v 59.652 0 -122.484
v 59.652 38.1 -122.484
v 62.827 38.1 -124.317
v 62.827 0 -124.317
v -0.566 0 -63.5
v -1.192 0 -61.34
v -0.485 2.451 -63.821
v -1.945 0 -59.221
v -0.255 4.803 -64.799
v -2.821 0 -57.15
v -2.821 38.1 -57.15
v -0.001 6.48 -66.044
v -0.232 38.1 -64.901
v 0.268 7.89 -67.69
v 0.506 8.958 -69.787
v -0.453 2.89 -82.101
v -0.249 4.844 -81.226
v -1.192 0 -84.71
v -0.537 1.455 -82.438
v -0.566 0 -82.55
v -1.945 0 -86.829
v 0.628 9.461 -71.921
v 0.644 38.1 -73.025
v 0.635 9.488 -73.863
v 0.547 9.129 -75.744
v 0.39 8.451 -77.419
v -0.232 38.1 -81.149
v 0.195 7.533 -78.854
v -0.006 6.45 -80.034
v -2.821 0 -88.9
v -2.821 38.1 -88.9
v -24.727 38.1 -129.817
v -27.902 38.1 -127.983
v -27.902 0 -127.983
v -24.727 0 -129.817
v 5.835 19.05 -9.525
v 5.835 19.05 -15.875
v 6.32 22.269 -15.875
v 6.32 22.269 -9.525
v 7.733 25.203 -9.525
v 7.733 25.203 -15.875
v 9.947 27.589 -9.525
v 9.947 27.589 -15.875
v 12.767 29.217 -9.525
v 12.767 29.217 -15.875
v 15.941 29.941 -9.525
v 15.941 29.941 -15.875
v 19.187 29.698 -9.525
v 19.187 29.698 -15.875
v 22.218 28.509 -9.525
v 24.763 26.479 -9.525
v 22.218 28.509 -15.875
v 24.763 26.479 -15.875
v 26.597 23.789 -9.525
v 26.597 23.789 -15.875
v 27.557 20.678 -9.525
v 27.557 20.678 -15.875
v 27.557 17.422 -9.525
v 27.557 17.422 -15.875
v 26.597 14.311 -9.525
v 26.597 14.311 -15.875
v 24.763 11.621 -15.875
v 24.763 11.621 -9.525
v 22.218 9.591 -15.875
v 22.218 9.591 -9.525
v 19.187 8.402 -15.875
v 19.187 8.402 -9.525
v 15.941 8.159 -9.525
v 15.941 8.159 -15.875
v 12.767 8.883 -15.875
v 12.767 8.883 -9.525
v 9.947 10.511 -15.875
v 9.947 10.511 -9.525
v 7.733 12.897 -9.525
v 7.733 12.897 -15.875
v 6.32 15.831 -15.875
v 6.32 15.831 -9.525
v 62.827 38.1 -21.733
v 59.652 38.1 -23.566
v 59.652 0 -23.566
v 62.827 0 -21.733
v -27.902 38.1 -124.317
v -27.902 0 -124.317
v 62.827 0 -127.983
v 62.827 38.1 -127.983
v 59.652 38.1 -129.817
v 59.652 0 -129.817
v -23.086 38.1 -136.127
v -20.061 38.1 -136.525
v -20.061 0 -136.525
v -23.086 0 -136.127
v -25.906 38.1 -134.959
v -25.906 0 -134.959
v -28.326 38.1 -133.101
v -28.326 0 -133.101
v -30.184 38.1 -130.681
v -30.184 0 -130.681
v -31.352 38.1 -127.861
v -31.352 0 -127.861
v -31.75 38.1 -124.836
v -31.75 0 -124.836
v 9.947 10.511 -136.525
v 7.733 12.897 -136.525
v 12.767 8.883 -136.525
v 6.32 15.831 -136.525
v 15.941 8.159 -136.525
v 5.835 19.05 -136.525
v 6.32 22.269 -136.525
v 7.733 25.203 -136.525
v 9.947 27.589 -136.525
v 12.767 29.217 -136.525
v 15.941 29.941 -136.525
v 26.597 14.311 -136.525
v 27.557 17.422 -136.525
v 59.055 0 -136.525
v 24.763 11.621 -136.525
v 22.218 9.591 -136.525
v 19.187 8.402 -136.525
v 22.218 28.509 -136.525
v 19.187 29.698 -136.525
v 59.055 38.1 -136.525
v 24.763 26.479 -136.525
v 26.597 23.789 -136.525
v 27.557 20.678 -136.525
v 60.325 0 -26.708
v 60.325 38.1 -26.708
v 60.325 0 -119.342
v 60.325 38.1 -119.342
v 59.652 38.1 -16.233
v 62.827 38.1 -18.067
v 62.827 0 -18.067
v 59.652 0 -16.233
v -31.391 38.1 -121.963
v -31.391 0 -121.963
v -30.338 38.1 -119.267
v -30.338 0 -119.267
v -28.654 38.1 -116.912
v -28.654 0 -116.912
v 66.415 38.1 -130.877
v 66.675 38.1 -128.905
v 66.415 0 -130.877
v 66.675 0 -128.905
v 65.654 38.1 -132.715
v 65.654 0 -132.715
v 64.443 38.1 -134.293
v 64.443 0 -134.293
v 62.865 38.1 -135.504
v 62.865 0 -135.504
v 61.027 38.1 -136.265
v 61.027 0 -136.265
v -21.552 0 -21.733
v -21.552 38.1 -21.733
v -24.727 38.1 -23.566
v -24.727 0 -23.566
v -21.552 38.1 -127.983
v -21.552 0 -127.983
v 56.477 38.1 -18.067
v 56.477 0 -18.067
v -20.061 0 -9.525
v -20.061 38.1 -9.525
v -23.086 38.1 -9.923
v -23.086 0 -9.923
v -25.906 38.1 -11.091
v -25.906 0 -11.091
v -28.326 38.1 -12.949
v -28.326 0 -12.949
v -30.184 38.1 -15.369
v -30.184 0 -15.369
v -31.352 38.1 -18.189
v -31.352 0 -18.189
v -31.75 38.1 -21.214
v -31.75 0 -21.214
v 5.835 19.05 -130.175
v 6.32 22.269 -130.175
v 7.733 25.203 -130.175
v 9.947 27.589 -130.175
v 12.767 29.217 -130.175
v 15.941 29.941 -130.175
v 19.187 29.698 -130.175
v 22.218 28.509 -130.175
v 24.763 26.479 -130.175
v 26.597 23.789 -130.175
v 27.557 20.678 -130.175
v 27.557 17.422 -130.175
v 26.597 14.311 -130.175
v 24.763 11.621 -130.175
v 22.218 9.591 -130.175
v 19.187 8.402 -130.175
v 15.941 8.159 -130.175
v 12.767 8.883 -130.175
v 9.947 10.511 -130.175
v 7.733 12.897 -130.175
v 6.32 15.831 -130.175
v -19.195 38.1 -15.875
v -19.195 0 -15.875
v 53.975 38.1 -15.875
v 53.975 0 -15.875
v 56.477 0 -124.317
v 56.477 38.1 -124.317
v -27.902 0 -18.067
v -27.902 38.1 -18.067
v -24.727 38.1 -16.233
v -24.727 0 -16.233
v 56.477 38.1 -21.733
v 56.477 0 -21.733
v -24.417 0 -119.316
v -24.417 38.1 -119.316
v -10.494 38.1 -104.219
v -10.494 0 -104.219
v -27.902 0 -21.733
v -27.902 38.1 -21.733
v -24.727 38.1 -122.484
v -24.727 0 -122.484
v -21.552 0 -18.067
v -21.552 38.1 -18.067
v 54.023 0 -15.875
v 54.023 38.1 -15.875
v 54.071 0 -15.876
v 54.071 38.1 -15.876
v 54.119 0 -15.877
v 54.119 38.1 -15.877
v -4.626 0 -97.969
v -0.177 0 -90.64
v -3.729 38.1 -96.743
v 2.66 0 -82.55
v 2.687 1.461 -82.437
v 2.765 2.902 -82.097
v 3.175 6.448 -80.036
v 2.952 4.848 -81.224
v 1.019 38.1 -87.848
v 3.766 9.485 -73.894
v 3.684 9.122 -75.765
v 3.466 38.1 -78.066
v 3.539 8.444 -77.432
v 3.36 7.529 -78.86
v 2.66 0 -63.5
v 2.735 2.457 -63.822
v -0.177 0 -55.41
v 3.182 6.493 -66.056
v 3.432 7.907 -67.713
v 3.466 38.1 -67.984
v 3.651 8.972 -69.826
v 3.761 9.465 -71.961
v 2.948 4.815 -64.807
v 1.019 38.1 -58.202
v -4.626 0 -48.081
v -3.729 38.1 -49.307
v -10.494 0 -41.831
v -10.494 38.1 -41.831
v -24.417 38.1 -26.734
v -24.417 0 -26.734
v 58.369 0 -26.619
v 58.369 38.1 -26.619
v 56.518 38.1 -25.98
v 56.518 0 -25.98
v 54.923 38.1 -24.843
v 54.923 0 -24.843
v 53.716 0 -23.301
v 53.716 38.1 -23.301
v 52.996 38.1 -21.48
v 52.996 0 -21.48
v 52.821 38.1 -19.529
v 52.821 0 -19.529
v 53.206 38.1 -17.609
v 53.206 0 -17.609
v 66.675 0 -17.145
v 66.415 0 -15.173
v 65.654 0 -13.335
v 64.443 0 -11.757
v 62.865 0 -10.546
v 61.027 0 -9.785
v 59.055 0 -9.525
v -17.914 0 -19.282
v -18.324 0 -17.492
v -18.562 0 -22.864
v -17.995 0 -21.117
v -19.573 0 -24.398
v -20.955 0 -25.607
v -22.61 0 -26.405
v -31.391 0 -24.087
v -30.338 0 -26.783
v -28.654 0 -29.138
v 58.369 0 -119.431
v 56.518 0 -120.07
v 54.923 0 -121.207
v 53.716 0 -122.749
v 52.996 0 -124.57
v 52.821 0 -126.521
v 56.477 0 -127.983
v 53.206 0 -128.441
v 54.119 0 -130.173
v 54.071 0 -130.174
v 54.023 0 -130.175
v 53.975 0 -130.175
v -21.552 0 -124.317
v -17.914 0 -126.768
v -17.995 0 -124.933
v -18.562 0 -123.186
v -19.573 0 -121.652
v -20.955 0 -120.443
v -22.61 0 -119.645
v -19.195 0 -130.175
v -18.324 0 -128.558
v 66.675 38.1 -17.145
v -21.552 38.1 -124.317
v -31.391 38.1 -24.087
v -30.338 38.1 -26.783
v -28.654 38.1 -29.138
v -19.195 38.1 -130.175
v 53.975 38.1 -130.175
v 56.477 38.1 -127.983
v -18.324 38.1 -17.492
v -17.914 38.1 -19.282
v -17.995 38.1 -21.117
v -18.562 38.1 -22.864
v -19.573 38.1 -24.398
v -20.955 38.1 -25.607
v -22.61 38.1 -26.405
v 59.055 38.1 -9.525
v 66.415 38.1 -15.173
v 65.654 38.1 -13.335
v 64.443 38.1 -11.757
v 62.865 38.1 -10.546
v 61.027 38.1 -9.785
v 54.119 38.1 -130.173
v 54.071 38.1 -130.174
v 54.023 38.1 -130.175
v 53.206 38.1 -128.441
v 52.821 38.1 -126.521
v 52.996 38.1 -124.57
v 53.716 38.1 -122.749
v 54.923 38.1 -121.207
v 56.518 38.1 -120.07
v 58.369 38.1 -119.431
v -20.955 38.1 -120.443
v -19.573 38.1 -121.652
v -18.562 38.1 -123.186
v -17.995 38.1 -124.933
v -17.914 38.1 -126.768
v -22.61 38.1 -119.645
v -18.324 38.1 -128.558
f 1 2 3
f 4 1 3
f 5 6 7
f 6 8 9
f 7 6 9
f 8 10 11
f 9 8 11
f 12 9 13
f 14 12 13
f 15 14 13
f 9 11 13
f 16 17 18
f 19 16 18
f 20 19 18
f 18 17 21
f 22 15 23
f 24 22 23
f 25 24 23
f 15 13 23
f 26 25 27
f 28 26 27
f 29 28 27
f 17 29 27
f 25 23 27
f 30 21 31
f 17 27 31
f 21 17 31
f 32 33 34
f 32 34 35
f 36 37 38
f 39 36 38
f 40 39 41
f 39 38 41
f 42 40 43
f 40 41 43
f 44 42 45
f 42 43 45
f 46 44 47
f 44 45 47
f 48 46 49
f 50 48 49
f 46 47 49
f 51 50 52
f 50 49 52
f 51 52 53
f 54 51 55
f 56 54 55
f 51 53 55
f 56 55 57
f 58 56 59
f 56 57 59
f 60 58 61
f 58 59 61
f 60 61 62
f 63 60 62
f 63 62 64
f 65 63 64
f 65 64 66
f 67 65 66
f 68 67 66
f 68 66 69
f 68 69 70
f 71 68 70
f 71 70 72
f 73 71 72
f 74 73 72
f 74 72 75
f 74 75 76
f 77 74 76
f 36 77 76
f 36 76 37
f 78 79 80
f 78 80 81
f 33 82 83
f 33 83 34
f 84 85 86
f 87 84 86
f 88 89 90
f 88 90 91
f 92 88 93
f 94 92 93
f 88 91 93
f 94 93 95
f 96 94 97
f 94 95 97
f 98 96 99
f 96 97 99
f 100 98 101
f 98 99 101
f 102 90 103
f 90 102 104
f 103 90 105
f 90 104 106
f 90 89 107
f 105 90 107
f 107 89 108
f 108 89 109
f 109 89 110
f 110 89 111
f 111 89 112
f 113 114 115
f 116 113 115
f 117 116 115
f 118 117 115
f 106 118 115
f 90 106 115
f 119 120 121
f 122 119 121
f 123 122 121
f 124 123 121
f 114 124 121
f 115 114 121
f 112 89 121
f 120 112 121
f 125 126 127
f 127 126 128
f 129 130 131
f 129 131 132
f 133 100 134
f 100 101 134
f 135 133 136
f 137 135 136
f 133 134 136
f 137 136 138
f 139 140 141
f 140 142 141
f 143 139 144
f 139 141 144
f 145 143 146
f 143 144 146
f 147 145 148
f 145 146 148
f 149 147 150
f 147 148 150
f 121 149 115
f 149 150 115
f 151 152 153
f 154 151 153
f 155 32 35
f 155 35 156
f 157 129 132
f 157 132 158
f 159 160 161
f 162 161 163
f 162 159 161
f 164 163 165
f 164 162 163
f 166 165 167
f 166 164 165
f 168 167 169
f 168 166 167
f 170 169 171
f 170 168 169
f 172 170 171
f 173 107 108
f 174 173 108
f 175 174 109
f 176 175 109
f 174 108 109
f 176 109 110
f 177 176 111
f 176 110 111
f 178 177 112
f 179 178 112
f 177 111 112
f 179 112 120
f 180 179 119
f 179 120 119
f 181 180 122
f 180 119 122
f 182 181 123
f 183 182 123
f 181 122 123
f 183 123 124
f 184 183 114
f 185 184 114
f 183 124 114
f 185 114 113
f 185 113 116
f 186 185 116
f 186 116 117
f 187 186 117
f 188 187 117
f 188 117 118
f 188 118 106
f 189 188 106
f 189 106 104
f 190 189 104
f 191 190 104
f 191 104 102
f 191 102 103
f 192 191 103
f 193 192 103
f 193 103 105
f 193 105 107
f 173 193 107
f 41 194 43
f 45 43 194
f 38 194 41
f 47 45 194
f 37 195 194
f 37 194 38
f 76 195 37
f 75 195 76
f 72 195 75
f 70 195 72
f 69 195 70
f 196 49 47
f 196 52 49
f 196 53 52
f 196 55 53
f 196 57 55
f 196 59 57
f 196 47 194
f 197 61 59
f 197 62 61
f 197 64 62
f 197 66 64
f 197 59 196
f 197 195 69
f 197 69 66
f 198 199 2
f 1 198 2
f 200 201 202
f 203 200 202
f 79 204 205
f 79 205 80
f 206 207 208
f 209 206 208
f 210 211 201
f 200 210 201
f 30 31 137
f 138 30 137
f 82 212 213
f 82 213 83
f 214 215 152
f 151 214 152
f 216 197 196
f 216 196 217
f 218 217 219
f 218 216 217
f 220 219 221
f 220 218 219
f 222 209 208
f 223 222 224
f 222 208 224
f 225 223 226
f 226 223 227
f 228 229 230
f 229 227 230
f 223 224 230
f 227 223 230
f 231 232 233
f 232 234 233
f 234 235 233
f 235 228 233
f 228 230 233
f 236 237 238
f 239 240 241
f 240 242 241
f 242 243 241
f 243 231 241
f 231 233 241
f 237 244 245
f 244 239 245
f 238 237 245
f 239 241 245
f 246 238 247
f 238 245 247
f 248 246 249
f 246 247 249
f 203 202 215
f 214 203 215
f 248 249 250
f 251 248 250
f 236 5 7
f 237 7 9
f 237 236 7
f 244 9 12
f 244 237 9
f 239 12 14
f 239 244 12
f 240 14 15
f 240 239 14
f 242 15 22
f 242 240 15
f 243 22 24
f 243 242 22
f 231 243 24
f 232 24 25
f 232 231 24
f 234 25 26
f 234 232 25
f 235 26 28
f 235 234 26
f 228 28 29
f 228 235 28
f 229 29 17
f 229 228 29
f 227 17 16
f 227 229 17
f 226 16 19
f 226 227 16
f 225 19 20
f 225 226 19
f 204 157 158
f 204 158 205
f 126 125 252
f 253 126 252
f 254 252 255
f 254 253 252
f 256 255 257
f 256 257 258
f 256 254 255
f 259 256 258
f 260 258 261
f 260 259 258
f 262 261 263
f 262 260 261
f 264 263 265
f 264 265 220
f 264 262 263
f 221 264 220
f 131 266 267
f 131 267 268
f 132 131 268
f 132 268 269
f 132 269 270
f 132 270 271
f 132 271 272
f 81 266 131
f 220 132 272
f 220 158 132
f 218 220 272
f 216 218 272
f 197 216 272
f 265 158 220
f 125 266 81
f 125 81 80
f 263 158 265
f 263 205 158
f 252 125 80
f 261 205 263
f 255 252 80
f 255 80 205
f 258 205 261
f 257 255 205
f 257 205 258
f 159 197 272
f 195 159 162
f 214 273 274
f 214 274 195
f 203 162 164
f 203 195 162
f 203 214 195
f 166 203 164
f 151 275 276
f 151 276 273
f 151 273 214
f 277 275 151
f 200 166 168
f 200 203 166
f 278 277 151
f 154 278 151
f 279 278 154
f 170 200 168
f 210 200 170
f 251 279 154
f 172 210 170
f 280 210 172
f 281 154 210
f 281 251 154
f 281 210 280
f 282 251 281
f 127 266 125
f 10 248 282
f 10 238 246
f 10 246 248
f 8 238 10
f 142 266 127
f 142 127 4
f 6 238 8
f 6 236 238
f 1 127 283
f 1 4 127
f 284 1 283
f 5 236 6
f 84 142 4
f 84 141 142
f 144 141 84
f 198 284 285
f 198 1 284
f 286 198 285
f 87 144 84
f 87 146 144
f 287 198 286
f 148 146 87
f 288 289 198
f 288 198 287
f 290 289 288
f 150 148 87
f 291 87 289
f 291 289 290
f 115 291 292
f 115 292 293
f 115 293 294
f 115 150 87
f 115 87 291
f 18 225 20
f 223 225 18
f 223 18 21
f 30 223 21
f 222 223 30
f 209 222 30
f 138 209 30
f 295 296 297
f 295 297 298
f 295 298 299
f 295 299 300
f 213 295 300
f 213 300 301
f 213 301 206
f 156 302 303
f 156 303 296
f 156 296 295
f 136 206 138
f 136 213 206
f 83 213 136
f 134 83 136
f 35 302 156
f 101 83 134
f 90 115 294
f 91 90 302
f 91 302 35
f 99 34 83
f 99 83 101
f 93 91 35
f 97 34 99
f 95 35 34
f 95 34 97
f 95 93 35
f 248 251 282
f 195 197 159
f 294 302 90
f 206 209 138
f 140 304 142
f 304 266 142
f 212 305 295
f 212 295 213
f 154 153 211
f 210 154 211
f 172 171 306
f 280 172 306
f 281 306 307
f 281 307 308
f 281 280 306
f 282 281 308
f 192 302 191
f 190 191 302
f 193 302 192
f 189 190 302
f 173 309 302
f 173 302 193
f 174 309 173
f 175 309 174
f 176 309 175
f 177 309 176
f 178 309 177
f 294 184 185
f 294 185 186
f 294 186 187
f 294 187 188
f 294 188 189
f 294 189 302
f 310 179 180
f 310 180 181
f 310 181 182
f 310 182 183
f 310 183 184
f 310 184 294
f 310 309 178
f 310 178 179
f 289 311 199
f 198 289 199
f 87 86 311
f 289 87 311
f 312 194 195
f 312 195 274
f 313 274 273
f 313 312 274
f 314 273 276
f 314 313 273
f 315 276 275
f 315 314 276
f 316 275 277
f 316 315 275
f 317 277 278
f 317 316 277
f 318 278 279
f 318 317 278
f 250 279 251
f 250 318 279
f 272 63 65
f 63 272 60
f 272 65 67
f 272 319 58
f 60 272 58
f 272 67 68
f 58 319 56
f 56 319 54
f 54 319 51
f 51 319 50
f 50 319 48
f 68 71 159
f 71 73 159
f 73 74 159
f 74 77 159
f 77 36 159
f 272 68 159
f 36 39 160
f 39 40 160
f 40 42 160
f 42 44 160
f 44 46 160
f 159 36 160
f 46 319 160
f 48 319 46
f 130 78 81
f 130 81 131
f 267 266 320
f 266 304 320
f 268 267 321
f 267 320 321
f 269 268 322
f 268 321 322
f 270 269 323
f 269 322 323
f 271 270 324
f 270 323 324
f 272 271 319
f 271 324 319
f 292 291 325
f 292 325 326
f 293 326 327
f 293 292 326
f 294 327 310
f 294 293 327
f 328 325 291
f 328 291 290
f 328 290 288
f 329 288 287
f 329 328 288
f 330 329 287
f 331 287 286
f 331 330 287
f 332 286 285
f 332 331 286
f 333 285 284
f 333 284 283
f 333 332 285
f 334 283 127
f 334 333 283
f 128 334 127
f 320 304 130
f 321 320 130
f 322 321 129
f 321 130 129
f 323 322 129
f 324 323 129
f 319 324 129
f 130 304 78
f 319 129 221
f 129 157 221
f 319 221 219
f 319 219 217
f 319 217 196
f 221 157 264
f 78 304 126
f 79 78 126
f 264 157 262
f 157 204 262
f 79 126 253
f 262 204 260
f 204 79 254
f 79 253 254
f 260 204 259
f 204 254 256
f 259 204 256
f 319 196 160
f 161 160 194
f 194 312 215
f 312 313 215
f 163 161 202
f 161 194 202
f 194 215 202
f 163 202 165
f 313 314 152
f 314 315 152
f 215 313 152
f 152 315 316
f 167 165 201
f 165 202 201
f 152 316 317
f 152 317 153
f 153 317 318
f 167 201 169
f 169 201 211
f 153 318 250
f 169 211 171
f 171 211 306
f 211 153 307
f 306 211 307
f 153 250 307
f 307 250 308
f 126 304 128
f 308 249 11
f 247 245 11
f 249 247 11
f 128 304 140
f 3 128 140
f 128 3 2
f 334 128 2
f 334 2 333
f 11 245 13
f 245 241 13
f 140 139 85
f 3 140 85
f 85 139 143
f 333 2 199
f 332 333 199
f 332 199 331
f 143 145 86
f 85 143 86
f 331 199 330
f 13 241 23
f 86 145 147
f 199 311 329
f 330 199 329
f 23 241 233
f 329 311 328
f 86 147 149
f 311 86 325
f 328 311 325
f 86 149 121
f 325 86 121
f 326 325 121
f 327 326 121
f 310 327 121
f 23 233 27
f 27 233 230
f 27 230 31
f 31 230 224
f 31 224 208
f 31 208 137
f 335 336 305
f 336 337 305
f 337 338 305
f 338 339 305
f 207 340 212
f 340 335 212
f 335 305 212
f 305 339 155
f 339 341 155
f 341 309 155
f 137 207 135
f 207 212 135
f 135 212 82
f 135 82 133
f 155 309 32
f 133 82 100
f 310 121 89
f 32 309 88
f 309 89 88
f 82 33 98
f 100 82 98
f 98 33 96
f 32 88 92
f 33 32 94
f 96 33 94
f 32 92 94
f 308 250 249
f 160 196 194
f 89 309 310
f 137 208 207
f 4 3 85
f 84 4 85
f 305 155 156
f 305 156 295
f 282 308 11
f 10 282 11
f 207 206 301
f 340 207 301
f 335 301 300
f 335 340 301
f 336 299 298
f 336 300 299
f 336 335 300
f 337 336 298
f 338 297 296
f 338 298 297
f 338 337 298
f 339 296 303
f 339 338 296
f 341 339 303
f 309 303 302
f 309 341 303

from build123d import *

# Parameters (mm, degrees)
SKETCH1_W               = 95.25
SKETCH1_H               = 6.35
BOSS_EXTRUDE1_DEPTH     = 38.1
SKETCH2_W               = 6.35
SKETCH2_H               = 127
BOSS_EXTRUDE2_DEPTH     = 38.1
SKETCH3_W               = 88.9
SKETCH3_H               = 6.35
BOSS_EXTRUDE3_DEPTH     = 38.1
FILLET1_R               = 7.62
BOSS_EXTRUDE4_DEPTH     = 38.1
CUT_EXTRUDE8_REACH      = 171.022
CUT_EXTRUDE8_END_RADIUS = 38.1
FILLET2_R               = 11.688947
FILLET3_R               = 11.688947
FILLET4_R               = 6.35
SKETCH15_R              = 6.841174209
BOSS_EXTRUDE7_DEPTH     = 38.1
CUT_EXTRUDE12_DEPTH     = 157.640484095
SKETCH4_R               = 10.922
CUT_EXTRUDE1_DEPTH      = 149.412147861


with BuildPart() as part:
    # Sketch1 → Boss-Extrude1 (new body)
    with BuildSketch(Plane(origin=(0, 0, 0), x_dir=(1, 0, 0), z_dir=(0, 1, 0))):
        with Locations((19.05, 12.7)):
            Rectangle(SKETCH1_W, SKETCH1_H)
    extrude(amount=BOSS_EXTRUDE1_DEPTH)

    # Sketch2 → Boss-Extrude2 (add)
    with BuildSketch(Plane(origin=(0, 38.1, 0), x_dir=(1, 0, 0), z_dir=(0, 1, 0))):
        with Locations((63.5, 73.025)):
            Rectangle(SKETCH2_W, SKETCH2_H)
    extrude(amount=-BOSS_EXTRUDE2_DEPTH)

    # Sketch3 → Boss-Extrude3 (add)
    with BuildSketch(Plane(origin=(0, 38.1, 0), x_dir=(1, 0, 0), z_dir=(0, 1, 0))):
        with Locations((15.875, 133.35)):
            Rectangle(SKETCH3_W, SKETCH3_H)
    extrude(amount=-BOSS_EXTRUDE3_DEPTH)

    # Fillet1
    fillet1_edges = [part.edges().sort_by_distance(p)[0] for p in [
        (66.675, 19.05, -136.525),
        (66.675, 19.05, -9.525),
    ]]
    fillet(fillet1_edges, radius=FILLET1_R)

    # Sketch10 → Boss-Extrude4 (add)
    with BuildSketch(Plane(origin=(0, 38.1, 0), x_dir=(1, 0, 0), z_dir=(0, 1, 0))):
        with BuildLine():
            Line((-28.575, 15.875), (-28.575, 9.525))
            Line((-28.575, 9.525), (-31.75, 9.525))
            Line((-31.75, 9.525), (-31.75, 25.781))
            Line((-31.75, 25.781), (-2.821027965, 57.15))
            ThreePointArc((-2.821027965, 57.15), (0.643811071, 73.025), (-2.821027965, 88.9))
            Line((-2.821027965, 88.9), (-31.75, 120.269))
            Line((-31.75, 120.269), (-31.75, 136.525))
            Line((-31.75, 136.525), (-28.575, 136.525))
            Line((-28.575, 136.525), (-28.575, 123.825))
            Line((-28.575, 123.825), (-10.494392478, 104.219375))
            ThreePointArc((-10.494392478, 104.219375), (3.775200806, 73.025), (-10.494392478, 41.830625))
            Line((-10.494392478, 41.830625), (-28.575, 22.225))
            Line((-28.575, 22.225), (-28.575, 15.875))
        make_face()
    extrude(amount=-BOSS_EXTRUDE4_DEPTH)

    # Cut-Extrude8: up to this cylinder (the profile starts outside it)
    cut_extrude8_end = Plane(origin=(-37.456188929, 4.042536, -73.025), z_dir=(0, 1, 0)) * Cylinder(CUT_EXTRUDE8_END_RADIUS, 419.244, mode=Mode.PRIVATE)
    # Sketch12 → Cut-Extrude8 (cut, up to the surface)
    with BuildSketch(Plane.ZY.offset(-60.325), mode=Mode.PRIVATE) as cut_extrude8_sk1:
        with BuildLine():
            Line((-82.55, 0), (-63.5, 0))
            ThreePointArc((-63.5, 0), (-73.025, 9.525), (-82.55, 0))
        make_face()
    cut_extrude8_tool1 = extrude(cut_extrude8_sk1.sketch, amount=CUT_EXTRUDE8_REACH, mode=Mode.PRIVATE) - cut_extrude8_end
    add(cut_extrude8_tool1.solids().sort_by_distance((60.325, 4.042536, -73.025))[0], mode=Mode.SUBTRACT)

    # Fillet2
    fillet2_edges = [part.edges().sort_by_distance(p)[0] for p in [
        (-31.75, 19.05, -136.525),
        (-31.75, 19.05, -120.269),
    ]]
    fillet(fillet2_edges, radius=FILLET2_R - 0.0001)  # a hair under: the kernel refuses the full size

    # Fillet3
    fillet3_edges = [part.edges().sort_by_distance(p)[0] for p in [
        (-31.75, 19.05, -25.781),
        (-31.75, 19.05, -9.525),
    ]]
    fillet(fillet3_edges, radius=FILLET3_R - 0.0001)  # a hair under: the kernel refuses the full size

    # Fillet4
    fillet4_edges = [part.edges().sort_by_distance(p)[0] for p in [
        (60.325, 19.05, -15.875),
        (60.325, 19.05, -130.175),
    ]]
    fillet(fillet4_edges, radius=FILLET4_R)

    # Sketch15 → Boss-Extrude7 (add)
    # profile 1 of 4: a face of its own
    with BuildSketch(Plane(origin=(0, 38.1, 0), x_dir=(1, 0, 0), z_dir=(0, 1, 0))):
        with Locations((59.652254611, 126.150383493)):
            Circle(SKETCH15_R)
        Polygon((59.652254611, 129.816557703), (56.477254611, 127.983470598), (56.477254611, 124.317296388), (59.652254611, 122.484209284), (62.827254611, 124.317296388), (62.827254611, 127.983470598), align=None, mode=Mode.SUBTRACT)
    # profile 2 of 4: a face of its own
    with BuildSketch(Plane(origin=(0, 38.1, 0), x_dir=(1, 0, 0), z_dir=(0, 1, 0))):
        with Locations((-24.727254611, 19.899616507)):
            Circle(SKETCH15_R)
        Polygon((-21.552254611, 21.732703612), (-24.727254611, 23.565790716), (-27.902254611, 21.732703612), (-27.902254611, 18.066529402), (-24.727254611, 16.233442297), (-21.552254611, 18.066529402), align=None, mode=Mode.SUBTRACT)
    # profile 3 of 4: a face of its own
    with BuildSketch(Plane(origin=(0, 38.1, 0), x_dir=(1, 0, 0), z_dir=(0, 1, 0))):
        with Locations((-24.727254611, 126.150383493)):
            Circle(SKETCH15_R)
        Polygon((-21.552254611, 127.983470598), (-21.552254611, 124.317296388), (-24.727254611, 122.484209284), (-27.902254611, 124.317296388), (-27.902254611, 127.983470598), (-24.727254611, 129.816557703), align=None, mode=Mode.SUBTRACT)
    # profile 4 of 4: a face of its own
    with BuildSketch(Plane(origin=(0, 38.1, 0), x_dir=(1, 0, 0), z_dir=(0, 1, 0))):
        with Locations((59.652254611, 19.899616507)):
            Circle(SKETCH15_R)
        Polygon((56.477254611, 18.066529402), (56.477254611, 21.732703612), (59.652254611, 23.565790716), (62.827254611, 21.732703612), (62.827254611, 18.066529402), (59.652254611, 16.233442297), align=None, mode=Mode.SUBTRACT)
    extrude(amount=-BOSS_EXTRUDE7_DEPTH)

    # Sketch21 → Cut-Extrude12 (cut, through all)
    with BuildSketch(Plane(origin=(0, 38.1, 0), x_dir=(1, 0, 0), z_dir=(0, 1, 0))):
        Polygon((-21.552254611, 21.732703612), (-24.727254611, 23.565790716), (-27.902254611, 21.732703612), (-27.902254611, 18.066529402), (-24.727254611, 16.233442297), (-21.552254611, 18.066529402), align=None)
        Polygon((56.477254611, 18.066529402), (56.477254611, 21.732703612), (59.652254611, 23.565790716), (62.827254611, 21.732703612), (62.827254611, 18.066529402), (59.652254611, 16.233442297), align=None)
        Polygon((59.652254611, 129.816557703), (56.477254611, 127.983470598), (56.477254611, 124.317296388), (59.652254611, 122.484209284), (62.827254611, 124.317296388), (62.827254611, 127.983470598), align=None)
        Polygon((-21.552254611, 127.983470598), (-21.552254611, 124.317296388), (-24.727254611, 122.484209284), (-27.902254611, 124.317296388), (-27.902254611, 127.983470598), (-24.727254611, 129.816557703), align=None)
    extrude(amount=-CUT_EXTRUDE12_DEPTH, mode=Mode.SUBTRACT)

    # Sketch4 → Cut-Extrude1 (cut, through all)
    with BuildSketch(Plane(origin=(0, 0, -136.525), x_dir=(-1, 0, 0), z_dir=(0, 0, -1))):
        with Locations((-16.756915998, 19.05)):
            Circle(SKETCH4_R)
    extrude(amount=-CUT_EXTRUDE1_DEPTH, mode=Mode.SUBTRACT)


solid = part.part
